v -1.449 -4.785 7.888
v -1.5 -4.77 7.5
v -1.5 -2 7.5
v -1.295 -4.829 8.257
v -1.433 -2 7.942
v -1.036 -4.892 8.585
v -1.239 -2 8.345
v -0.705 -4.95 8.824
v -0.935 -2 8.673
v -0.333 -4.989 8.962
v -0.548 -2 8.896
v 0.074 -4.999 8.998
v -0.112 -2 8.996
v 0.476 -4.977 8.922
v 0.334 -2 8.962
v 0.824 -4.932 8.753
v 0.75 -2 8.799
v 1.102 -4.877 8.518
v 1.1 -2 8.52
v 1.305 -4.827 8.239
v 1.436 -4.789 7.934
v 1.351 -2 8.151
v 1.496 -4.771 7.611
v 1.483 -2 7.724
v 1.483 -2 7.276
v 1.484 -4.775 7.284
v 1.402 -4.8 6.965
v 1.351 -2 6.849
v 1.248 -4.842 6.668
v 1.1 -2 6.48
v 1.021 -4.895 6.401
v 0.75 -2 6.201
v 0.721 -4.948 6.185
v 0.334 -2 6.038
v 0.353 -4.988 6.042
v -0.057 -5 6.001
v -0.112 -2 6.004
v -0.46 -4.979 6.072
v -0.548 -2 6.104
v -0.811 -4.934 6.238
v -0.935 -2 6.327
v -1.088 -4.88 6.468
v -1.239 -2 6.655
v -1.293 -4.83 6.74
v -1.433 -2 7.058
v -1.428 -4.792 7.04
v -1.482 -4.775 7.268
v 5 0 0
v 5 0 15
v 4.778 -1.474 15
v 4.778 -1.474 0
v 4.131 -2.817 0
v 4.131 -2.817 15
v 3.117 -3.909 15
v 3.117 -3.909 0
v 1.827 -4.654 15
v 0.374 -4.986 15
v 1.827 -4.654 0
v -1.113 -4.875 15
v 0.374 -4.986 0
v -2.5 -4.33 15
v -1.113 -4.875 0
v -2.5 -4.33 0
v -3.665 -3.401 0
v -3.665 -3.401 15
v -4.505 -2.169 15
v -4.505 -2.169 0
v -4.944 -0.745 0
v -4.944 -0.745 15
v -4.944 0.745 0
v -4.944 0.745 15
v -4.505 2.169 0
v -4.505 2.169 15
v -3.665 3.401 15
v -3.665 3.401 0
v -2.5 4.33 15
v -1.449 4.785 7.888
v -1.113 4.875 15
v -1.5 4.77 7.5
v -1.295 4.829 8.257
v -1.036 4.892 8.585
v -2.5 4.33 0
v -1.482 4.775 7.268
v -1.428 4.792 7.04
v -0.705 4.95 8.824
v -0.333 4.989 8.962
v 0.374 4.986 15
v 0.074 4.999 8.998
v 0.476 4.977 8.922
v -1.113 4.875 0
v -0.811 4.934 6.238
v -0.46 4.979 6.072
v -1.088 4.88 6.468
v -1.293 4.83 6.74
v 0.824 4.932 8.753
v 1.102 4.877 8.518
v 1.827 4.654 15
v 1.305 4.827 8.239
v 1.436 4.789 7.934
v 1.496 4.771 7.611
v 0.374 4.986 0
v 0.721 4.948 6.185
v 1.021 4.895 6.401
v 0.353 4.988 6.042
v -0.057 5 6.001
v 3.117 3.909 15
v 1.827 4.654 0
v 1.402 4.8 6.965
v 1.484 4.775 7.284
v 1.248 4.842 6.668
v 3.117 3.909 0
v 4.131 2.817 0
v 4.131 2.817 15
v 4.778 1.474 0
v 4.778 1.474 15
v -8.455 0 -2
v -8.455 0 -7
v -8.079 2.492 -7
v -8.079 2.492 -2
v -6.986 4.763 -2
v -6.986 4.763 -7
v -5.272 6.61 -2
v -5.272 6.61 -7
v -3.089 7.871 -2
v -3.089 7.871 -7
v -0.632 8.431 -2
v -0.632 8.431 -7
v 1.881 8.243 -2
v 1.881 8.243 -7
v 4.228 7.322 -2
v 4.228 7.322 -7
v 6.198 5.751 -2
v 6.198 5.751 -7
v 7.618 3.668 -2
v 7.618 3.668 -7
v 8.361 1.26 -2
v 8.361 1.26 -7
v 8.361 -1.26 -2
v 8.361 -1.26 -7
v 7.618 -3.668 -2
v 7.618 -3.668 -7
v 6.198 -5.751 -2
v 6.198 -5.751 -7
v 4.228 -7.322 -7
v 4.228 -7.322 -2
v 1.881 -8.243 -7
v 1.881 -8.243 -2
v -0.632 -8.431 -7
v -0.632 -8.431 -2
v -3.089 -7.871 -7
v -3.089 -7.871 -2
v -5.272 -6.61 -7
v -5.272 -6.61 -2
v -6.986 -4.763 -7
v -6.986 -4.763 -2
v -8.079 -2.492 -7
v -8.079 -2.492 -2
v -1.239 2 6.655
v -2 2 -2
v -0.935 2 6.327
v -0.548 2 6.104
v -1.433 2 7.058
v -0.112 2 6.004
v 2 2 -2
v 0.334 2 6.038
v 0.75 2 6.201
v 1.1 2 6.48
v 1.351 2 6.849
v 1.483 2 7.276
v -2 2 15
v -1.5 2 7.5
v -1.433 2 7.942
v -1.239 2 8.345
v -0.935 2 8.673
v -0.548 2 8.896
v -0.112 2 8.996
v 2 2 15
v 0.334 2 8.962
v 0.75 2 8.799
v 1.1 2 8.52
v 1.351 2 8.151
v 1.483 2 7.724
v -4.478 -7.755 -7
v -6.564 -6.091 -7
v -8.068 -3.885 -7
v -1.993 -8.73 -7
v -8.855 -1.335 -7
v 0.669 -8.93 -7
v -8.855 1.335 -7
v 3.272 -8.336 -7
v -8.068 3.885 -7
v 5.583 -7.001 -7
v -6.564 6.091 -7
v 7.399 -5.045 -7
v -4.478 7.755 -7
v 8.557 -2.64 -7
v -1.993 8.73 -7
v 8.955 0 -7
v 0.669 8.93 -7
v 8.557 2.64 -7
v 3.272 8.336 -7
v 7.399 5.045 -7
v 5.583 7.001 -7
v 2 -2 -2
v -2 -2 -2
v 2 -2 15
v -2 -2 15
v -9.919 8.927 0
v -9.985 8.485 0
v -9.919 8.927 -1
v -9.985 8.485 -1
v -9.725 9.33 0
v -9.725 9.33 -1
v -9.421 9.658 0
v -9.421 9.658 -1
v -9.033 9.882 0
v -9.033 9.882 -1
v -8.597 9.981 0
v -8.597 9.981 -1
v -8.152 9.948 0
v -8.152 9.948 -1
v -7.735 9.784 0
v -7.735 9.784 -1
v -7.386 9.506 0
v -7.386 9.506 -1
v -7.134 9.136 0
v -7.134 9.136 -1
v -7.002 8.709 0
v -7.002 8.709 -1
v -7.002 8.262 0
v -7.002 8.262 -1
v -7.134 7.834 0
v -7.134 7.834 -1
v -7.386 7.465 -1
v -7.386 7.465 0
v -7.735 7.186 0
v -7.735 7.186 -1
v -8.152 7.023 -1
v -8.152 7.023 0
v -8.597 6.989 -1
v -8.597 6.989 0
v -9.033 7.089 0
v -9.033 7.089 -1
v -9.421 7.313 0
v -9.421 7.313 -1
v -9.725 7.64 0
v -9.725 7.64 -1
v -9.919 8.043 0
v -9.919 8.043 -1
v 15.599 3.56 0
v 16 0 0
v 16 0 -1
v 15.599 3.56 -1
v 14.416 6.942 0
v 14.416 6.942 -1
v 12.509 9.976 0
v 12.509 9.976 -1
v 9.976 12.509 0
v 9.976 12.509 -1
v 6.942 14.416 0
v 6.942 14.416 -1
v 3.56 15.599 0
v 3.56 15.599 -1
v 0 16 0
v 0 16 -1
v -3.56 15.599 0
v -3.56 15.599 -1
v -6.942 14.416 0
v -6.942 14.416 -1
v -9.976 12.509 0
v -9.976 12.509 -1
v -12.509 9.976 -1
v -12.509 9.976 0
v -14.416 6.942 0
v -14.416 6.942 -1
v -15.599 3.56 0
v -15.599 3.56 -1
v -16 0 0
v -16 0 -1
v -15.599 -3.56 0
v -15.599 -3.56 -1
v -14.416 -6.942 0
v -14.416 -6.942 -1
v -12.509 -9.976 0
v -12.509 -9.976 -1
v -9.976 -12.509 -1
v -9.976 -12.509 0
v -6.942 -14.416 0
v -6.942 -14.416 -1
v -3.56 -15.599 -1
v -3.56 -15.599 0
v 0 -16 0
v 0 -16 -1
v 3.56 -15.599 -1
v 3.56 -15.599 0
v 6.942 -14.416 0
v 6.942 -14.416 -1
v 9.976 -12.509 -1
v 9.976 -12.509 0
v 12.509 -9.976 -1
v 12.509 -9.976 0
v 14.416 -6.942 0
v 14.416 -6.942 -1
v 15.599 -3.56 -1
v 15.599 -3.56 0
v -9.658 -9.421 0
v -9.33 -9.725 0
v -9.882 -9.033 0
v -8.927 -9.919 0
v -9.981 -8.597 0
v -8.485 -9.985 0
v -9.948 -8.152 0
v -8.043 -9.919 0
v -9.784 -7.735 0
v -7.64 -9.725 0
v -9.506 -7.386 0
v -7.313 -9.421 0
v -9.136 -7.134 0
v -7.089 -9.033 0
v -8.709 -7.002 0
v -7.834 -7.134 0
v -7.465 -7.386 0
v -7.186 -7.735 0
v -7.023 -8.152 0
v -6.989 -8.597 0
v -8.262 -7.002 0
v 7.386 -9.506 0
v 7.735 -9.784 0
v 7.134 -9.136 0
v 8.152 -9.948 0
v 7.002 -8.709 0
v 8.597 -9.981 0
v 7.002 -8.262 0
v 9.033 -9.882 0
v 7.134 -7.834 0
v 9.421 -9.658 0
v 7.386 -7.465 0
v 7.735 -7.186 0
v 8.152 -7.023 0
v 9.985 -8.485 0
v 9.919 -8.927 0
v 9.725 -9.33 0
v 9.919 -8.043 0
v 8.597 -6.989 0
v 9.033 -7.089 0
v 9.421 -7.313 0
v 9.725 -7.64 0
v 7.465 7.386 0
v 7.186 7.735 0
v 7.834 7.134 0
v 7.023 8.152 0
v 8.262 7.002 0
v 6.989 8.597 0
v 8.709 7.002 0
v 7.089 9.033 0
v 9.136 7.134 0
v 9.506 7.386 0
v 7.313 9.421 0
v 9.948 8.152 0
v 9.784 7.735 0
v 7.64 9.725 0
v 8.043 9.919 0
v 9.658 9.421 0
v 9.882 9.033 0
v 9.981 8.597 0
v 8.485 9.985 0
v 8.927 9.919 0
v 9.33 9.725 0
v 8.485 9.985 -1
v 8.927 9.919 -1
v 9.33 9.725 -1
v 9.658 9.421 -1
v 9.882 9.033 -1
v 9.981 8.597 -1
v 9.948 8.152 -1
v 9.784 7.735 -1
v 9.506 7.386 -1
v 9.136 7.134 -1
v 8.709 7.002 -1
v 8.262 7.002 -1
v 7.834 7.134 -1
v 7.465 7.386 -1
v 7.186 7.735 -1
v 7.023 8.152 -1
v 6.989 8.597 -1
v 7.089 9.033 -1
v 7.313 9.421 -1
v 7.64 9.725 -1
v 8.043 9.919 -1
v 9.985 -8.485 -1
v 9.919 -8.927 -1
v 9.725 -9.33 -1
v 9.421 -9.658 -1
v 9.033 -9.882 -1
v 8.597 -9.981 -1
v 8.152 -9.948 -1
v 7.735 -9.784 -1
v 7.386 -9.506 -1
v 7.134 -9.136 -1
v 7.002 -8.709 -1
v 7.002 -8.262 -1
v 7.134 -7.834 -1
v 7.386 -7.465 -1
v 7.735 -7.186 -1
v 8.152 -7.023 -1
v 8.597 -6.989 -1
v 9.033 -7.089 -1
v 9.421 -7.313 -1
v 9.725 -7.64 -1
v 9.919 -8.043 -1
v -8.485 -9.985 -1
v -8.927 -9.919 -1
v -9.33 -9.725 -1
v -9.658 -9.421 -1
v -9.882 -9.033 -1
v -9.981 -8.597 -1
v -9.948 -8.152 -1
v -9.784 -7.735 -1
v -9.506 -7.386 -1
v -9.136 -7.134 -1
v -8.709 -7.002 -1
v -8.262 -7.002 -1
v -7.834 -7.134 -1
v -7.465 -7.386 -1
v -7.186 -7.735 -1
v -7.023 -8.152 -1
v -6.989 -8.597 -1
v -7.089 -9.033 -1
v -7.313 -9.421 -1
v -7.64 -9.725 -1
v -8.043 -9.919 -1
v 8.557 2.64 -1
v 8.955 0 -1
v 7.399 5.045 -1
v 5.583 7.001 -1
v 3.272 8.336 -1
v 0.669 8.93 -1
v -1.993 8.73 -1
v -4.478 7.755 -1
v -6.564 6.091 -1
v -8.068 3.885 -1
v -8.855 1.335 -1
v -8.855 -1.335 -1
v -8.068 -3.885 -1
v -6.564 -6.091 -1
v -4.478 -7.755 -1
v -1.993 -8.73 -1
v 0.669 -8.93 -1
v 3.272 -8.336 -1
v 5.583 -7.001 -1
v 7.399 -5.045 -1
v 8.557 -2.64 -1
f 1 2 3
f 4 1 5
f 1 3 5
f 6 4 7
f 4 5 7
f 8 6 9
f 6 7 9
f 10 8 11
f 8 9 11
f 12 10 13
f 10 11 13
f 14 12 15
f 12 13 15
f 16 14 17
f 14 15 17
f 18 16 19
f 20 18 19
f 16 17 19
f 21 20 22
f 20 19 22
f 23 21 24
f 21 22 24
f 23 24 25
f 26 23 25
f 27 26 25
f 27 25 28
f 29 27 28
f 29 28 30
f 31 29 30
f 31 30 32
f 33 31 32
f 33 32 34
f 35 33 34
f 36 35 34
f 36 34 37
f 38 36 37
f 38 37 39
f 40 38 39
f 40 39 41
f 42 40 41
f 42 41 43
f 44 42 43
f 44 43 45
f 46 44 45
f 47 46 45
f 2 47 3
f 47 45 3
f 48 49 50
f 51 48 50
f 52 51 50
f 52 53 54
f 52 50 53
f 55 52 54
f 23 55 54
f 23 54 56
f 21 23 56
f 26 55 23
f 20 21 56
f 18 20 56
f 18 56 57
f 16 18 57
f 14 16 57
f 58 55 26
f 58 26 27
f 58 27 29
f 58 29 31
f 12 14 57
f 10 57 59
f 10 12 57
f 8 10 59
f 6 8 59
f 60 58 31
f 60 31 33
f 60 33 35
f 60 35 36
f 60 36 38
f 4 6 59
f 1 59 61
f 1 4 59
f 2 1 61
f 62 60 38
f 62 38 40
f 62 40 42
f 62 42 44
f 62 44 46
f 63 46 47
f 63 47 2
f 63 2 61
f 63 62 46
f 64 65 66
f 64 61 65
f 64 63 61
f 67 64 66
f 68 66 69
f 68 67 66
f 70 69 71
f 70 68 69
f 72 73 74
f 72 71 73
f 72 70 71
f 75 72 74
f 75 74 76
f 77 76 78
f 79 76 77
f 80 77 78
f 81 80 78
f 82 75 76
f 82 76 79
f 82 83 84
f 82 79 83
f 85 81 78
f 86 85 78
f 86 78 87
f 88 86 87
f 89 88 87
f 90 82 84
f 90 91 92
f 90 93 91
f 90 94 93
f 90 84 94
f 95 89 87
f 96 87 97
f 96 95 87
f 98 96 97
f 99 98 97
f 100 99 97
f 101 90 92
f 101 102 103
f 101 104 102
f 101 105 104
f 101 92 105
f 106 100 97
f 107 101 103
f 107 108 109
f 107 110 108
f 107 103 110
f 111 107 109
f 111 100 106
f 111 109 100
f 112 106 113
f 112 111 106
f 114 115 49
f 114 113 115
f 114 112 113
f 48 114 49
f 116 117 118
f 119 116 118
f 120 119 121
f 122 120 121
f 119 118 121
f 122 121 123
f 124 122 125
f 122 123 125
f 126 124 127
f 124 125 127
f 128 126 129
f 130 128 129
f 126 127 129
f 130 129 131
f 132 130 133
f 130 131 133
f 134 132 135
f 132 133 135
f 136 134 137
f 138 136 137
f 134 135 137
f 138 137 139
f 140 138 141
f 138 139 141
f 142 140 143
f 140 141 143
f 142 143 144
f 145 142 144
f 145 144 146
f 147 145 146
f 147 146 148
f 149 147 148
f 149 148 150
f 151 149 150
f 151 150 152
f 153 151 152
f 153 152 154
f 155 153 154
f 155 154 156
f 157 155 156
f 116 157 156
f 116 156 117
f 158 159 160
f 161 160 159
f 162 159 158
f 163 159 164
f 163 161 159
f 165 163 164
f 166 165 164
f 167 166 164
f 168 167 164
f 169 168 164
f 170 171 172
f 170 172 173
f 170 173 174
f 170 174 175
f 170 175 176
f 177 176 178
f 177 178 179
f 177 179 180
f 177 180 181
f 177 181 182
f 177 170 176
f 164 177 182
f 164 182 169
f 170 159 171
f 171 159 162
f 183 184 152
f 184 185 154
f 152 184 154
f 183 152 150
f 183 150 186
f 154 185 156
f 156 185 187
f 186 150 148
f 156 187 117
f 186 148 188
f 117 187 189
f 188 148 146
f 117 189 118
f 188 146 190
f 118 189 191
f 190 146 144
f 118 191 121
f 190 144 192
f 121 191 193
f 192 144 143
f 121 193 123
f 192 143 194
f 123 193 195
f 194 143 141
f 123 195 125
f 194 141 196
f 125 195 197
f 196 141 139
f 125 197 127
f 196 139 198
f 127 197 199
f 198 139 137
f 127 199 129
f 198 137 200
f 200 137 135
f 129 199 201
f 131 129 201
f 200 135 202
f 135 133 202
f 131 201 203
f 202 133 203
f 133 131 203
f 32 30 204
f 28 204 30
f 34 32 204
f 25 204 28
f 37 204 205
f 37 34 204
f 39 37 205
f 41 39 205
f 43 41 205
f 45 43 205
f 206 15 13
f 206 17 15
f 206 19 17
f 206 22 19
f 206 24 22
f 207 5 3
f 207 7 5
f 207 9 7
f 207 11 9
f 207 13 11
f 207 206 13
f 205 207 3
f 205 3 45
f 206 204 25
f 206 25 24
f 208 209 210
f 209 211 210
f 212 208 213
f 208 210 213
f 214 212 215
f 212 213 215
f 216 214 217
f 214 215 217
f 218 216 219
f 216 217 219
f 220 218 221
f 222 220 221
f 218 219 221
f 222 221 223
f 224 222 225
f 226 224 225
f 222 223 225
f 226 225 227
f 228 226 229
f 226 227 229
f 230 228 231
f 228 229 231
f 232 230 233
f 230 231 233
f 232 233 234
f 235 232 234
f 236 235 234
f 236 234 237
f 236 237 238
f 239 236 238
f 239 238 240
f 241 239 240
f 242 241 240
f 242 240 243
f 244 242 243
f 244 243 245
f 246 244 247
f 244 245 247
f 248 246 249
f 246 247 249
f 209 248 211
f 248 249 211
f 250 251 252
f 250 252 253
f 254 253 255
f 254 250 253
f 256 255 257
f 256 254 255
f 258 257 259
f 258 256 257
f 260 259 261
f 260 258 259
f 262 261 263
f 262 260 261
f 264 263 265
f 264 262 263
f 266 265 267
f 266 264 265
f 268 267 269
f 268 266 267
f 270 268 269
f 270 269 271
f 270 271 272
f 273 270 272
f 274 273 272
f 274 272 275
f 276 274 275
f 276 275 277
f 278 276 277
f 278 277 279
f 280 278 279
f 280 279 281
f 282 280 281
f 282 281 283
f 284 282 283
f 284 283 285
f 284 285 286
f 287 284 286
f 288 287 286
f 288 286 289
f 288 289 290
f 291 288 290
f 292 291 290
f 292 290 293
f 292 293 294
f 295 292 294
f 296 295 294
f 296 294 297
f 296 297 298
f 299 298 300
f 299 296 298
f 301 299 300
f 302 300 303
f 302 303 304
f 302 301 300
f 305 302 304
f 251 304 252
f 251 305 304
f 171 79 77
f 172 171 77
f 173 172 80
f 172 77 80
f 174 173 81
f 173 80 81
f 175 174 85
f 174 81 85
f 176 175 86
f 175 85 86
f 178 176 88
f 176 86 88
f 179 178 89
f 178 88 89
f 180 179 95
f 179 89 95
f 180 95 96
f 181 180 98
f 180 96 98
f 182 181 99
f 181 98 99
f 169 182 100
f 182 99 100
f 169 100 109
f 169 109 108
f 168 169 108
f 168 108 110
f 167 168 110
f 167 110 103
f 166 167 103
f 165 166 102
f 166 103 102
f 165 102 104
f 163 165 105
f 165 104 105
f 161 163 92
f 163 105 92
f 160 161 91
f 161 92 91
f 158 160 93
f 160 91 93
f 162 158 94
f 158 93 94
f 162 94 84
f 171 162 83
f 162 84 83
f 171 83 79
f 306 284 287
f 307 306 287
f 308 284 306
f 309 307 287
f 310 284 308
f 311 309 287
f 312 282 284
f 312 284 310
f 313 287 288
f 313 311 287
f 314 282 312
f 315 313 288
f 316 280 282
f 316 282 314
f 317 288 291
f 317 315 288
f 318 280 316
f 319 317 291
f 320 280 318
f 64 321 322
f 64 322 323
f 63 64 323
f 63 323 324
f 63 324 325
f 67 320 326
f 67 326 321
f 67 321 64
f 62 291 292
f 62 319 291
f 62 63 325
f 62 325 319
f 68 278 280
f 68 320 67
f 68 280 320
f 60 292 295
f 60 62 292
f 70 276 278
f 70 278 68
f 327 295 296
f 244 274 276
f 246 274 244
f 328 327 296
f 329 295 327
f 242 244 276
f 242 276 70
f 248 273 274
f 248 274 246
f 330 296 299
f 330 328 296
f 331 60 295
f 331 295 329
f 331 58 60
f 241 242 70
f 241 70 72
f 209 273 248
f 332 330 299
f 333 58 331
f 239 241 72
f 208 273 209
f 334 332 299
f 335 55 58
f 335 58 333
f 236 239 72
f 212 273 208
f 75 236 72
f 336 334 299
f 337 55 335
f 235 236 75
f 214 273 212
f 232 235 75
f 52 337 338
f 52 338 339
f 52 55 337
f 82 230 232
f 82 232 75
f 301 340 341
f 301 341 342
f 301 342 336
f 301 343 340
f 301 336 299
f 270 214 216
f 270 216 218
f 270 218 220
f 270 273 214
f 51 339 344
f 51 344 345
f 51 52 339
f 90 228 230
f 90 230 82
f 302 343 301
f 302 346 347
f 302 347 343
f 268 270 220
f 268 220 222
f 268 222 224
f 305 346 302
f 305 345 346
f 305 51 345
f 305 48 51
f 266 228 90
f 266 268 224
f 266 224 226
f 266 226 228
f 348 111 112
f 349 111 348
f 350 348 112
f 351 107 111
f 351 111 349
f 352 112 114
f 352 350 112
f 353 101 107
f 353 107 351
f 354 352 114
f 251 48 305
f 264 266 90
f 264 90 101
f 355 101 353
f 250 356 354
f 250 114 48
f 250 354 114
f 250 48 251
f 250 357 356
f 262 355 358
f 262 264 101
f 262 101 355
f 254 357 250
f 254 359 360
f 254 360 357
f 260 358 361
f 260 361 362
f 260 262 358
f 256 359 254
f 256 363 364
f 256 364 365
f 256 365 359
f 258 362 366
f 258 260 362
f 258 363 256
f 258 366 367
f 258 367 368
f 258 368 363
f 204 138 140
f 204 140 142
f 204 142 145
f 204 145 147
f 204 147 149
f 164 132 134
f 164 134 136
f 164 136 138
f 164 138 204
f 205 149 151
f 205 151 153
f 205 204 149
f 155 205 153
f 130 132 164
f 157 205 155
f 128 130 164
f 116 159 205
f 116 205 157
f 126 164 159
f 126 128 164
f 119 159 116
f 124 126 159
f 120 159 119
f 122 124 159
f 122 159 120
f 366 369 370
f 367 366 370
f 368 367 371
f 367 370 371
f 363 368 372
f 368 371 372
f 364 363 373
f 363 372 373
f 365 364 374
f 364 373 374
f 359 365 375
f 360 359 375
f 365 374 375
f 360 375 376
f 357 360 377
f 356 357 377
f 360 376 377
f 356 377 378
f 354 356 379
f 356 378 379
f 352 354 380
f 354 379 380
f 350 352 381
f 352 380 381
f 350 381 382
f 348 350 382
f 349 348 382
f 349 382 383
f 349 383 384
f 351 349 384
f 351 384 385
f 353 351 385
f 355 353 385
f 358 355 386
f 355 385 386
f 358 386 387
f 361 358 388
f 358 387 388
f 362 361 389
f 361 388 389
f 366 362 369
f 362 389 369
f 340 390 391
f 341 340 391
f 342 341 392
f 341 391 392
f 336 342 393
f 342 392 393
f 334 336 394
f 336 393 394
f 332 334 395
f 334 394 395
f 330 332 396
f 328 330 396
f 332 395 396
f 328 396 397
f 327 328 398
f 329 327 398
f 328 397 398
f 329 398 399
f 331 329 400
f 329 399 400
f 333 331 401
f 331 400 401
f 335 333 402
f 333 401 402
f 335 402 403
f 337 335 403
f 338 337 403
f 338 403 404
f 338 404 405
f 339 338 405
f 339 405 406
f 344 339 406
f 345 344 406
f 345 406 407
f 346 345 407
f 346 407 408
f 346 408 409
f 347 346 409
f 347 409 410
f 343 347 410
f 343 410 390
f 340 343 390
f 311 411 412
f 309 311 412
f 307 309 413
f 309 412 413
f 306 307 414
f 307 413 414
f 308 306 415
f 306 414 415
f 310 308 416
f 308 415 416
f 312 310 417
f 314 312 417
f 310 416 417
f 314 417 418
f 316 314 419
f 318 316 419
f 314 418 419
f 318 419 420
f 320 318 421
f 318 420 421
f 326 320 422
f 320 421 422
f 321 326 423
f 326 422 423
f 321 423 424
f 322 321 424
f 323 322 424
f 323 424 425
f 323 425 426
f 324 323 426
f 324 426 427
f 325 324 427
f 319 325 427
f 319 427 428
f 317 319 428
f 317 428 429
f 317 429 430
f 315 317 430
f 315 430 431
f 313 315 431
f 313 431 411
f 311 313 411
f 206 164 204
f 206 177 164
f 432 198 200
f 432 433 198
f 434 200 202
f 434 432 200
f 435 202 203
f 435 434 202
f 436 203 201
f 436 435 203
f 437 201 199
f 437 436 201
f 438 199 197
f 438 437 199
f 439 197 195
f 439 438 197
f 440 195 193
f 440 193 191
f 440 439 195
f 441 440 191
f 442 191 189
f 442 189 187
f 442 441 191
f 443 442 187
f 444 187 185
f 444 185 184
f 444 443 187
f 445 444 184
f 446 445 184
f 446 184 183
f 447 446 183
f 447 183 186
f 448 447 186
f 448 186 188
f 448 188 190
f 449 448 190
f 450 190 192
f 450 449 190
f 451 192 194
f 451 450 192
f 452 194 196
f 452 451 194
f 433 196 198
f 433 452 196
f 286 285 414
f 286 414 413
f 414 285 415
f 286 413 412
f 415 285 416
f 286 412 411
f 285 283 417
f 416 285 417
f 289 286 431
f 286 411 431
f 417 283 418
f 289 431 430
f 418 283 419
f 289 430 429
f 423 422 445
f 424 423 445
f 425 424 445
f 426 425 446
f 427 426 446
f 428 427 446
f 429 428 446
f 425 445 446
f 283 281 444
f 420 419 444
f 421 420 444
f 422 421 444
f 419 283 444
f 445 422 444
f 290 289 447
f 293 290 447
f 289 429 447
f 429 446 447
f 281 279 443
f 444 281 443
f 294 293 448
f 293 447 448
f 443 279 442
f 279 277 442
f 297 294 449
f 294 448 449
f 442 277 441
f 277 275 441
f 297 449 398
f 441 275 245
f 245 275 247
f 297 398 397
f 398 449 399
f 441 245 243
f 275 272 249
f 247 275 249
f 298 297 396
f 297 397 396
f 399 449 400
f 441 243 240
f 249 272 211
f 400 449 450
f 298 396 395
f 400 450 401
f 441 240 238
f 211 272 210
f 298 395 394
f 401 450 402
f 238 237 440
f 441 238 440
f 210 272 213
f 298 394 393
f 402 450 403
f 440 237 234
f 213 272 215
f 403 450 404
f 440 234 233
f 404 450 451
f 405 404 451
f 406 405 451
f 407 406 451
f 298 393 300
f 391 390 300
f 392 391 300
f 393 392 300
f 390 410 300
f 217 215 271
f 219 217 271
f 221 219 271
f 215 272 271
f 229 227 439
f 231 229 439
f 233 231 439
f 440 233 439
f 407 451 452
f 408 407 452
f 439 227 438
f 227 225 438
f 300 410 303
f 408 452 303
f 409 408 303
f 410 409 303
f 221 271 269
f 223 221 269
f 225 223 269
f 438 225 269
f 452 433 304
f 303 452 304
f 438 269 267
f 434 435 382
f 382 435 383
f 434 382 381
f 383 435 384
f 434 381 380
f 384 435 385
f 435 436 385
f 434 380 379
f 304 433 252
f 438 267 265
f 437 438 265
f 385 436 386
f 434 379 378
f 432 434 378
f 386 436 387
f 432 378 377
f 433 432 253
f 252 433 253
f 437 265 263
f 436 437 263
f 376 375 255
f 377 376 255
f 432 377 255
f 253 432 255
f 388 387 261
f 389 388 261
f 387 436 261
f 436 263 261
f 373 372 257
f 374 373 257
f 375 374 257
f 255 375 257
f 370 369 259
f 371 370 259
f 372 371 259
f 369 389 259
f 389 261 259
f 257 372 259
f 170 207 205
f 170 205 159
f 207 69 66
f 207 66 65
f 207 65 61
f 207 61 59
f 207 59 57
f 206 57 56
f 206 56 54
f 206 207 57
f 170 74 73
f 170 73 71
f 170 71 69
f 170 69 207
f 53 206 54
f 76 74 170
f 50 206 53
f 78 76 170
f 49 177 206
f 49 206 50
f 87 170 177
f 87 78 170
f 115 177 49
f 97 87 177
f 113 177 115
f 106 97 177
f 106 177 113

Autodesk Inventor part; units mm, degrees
ref_plane "YZ Plane" through (0, 0, 0) normal (1, 0, 0) x (0, 1, 0)
ref_plane "XY Plane" through (0, 0, 0) normal (0, 0, 1) x (1, 0, 0)
sketch "Sketch1" plane through (0, 0, 0) normal (0, 0, 1) x (1, 0, 0)
  circle A0 centre (0, 0) radius 16
  line L0 (0, 0) -> (0, 8.955)
  circle A1 centre (0, 0) radius 8.955
  dimension "d0" = 32
  dimension "d1" = 8.955
extrude "Extrusion1" add sketch "Sketch1" against normal blind 1 contours A0 | A1
extrude "Extrusion2" add sketch "Sketch1" against normal blind 7 contours A1
sketch "Sketch2" plane through (0, 0, -7) normal (0, 0, -1) x (-1, 0, 0)
  circle A0 centre (0, 0) radius 8.455
  dimension "d6" = 16.91
extrude "Extrusion3" cut sketch "Sketch2" against normal blind 5
sketch "Sketch3" plane through (0, 0, 0) normal (0, 0, 1) x (1, 0, 0)
  circle A0 centre (0, 0) radius 5
  dimension "d9" = 10
extrude "Extrusion4" add sketch "Sketch3" along normal blind 15
sketch "Sketch4" plane through (0, 0, 15) normal (0, 0, 1) x (1, 0, 0)
  line L0 (-2, 2) -> (2, 2)
  line L1 (2, 2) -> (2, -2)
  line L2 (2, -2) -> (-2, -2)
  line L3 (-2, -2) -> (-2, 2)
  line L4 (-2, 2) -> (2, -2) construction
  line L5 (2, 2) -> (-2, -2) construction
  point P0 (0, 0)
  dimension "d12" = 4
  dimension "d13" = 4
extrude "Extrusion5" cut sketch "Sketch4" against normal through all
ref_plane "Work Plane1" through (0, 5.25, 0) normal (0, 1, 0) x (-1, 0, 0)
sketch "Sketch5" plane through (0, 5.25, 0) normal (0, 1, 0) x (-1, 0, 0)
  circle A0 centre (0, 7.5) radius 1.5
  point P0 (0, 0)
  dimension "d17" = 3
extrude "Extrusion6" cut sketch "Sketch5" against normal through all
thread "Thread1" size "M3x0.5" class "6H" standard "ANSI Metric M Profile" full length
thread "Thread2" size "M3x0.5" class "6H" standard "ANSI Metric M Profile" full length
sketch "Sketch7" plane through (0, 0, -1) normal (0, 0, -1) x (-1, 0, 0)
  circle A0 centre (0, 0) radius 5 projected
  line L0 (0, 0) -> (8.4853, 8.4853)
  line L1 (0, 0) -> (12, 0) construction
  circle A1 centre (8.4853, 8.4853) radius 1.5
  dimension "d24" = 12
  dimension "d25" = 45
  dimension "d26" = 3
extrude "Extrusion7" cut sketch "Sketch7" against normal through all contours A1
thread "Thread3" size "M3x0.5" class "6H" standard "ANSI Metric M Profile" full length
pattern_circular "Circular Pattern1" count 4 over 360 about axis through (0, 0, 0) along (0, 0, -1) of "Extrusion7"
thread "Thread4" size "M3x0.5" class "6H" standard "ANSI Metric M Profile" full length
thread "Thread5" size "M3x0.5" class "6H" standard "ANSI Metric M Profile" full length
thread "Thread6" size "M3x0.5" class "6H" standard "ANSI Metric M Profile" full length
properties part number "tuk-tukan" material "Stainless Steel"
